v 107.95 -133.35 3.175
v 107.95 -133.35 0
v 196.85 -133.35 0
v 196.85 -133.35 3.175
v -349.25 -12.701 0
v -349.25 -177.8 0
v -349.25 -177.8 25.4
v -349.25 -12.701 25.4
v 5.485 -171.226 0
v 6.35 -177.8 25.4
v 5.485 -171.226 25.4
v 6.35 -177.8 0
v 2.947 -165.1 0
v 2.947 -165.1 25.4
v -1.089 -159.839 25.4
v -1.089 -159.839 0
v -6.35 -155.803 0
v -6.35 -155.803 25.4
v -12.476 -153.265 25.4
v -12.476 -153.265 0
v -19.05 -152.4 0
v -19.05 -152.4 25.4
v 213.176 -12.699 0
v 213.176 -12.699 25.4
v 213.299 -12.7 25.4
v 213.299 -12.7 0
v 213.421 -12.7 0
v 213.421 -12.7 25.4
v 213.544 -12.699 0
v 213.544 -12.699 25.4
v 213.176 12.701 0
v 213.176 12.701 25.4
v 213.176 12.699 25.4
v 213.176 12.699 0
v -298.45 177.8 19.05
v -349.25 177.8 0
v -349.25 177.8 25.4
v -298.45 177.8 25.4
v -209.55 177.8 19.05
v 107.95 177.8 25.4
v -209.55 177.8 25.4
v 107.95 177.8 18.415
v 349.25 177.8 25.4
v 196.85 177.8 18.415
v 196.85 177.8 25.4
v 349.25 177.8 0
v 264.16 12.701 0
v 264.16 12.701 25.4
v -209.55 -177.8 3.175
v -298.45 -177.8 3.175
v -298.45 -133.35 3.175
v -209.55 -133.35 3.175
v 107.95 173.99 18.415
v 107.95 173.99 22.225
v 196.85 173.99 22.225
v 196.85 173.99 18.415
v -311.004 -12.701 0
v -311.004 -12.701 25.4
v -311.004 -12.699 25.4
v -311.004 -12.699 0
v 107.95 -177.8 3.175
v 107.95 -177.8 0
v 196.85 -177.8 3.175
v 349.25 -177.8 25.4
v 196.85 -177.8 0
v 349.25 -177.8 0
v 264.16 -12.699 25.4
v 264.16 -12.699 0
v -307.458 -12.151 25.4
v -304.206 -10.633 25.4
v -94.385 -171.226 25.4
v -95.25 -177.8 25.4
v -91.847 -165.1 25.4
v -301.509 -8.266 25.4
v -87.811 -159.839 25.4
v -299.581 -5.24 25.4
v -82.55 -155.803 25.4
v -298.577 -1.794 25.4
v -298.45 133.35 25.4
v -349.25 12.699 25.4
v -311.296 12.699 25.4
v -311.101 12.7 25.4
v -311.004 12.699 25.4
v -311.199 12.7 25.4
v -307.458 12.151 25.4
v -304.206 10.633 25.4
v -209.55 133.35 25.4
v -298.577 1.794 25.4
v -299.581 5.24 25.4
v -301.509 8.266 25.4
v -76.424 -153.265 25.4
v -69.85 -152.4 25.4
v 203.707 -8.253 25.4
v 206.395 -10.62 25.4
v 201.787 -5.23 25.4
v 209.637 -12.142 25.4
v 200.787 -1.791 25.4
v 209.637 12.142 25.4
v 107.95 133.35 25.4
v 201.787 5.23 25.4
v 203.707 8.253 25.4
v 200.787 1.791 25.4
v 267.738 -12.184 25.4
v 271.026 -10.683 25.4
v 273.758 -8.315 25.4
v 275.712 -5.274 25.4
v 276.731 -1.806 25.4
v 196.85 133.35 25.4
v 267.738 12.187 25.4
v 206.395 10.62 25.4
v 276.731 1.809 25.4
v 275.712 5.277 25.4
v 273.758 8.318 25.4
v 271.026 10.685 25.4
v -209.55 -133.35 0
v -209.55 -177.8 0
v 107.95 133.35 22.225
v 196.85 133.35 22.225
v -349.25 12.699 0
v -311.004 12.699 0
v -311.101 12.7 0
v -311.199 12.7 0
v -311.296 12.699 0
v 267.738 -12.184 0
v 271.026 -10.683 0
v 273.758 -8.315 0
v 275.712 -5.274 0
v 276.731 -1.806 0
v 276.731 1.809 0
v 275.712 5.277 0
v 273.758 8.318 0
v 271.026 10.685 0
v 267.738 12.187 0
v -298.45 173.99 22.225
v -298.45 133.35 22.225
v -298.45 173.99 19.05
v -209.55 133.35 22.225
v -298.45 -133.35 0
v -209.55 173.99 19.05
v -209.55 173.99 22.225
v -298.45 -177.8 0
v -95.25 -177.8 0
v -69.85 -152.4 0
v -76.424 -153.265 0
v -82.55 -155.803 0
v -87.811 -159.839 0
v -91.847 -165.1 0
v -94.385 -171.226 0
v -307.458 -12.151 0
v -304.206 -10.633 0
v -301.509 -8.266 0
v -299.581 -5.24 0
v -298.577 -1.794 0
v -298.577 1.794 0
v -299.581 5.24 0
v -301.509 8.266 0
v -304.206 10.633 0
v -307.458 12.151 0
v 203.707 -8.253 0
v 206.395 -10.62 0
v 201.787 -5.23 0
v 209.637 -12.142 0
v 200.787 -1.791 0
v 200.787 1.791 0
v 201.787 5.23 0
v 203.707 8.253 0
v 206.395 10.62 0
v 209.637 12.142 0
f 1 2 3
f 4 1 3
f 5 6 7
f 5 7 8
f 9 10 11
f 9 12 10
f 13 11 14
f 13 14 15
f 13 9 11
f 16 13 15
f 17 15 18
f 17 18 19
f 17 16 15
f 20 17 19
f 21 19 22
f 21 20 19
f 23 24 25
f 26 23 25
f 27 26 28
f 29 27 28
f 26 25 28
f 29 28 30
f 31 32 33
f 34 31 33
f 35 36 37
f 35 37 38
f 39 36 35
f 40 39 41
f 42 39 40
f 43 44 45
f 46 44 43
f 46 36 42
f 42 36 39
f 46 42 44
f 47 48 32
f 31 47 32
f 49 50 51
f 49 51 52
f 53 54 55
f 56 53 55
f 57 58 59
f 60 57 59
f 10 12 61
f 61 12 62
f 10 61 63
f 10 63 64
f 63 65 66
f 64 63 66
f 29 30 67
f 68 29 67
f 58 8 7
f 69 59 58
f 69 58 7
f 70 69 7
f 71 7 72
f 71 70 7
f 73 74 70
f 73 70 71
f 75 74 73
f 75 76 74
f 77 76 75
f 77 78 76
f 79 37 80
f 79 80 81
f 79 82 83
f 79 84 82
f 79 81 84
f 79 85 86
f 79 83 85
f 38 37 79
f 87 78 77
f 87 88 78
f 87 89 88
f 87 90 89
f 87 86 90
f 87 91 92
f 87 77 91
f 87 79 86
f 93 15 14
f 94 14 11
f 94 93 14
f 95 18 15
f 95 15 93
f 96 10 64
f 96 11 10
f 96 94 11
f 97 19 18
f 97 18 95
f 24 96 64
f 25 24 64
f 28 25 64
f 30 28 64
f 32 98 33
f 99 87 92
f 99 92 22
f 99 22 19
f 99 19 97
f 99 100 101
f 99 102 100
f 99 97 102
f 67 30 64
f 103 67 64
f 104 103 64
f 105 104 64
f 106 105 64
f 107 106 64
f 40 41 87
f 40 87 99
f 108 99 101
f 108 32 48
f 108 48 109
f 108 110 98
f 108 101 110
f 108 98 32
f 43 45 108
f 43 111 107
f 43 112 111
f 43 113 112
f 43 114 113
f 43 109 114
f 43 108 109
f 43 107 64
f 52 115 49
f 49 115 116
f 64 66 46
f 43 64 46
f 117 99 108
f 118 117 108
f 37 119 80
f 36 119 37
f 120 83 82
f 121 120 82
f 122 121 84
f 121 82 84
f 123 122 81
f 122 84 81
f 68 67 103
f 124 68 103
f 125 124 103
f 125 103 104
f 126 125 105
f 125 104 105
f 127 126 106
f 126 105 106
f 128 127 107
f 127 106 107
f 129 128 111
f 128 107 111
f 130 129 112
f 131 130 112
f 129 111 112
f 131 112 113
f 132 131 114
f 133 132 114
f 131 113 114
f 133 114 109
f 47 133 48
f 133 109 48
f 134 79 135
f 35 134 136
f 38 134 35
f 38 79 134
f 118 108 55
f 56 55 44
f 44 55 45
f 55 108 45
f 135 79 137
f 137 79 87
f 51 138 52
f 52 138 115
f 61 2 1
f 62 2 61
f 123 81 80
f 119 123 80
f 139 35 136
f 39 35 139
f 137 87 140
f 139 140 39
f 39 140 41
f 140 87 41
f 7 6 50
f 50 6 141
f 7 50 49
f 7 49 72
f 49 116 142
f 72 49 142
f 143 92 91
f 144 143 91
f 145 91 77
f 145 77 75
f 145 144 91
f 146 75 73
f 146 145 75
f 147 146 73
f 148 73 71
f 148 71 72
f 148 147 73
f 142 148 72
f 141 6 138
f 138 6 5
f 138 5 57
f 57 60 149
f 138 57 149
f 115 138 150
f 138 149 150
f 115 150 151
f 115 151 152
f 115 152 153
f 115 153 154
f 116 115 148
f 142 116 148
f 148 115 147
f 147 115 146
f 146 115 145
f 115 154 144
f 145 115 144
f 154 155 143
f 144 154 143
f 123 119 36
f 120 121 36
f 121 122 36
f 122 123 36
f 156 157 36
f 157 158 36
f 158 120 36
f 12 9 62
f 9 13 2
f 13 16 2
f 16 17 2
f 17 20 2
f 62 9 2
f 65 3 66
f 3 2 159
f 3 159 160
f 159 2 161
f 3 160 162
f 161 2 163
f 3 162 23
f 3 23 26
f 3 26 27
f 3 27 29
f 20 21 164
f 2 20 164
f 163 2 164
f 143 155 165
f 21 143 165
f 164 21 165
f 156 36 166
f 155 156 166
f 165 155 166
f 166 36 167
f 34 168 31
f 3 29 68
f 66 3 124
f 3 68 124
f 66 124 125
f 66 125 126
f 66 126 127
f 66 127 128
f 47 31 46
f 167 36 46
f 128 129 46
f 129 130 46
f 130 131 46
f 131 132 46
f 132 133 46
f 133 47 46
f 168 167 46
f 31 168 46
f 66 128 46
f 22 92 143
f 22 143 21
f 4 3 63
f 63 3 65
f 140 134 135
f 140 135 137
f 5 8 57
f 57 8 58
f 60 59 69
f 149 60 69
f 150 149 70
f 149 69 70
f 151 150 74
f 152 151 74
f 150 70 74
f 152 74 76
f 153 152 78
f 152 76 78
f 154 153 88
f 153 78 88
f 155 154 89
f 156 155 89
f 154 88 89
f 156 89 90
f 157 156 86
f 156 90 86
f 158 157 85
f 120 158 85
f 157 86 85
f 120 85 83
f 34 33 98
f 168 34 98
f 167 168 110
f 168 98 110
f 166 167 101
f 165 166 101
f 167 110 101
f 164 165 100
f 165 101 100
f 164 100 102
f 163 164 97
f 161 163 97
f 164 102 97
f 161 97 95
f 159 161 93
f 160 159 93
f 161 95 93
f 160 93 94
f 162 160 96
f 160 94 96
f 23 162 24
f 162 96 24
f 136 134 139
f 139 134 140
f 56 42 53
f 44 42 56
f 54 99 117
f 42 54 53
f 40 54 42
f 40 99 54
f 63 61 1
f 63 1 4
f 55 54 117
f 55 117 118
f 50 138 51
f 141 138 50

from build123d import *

# Parameters (mm, degrees)
F0_W      = 698.5
F0_H      = 355.6
F1_DEPTH  = 25.4
F2_W      = 88.9
F2_H      = 44.45
F3_DEPTH  = 3.175
F4_W      = 88.9
F4_H      = 44.45
F5_DEPTH  = 3.175
F6_W      = 88.9
F6_H      = 3.81
F7_DEPTH  = 3.175
F8_W      = 88.9
F8_H      = 3.81
F9_DEPTH  = 3.81
F11_DEPTH = 25.4
F12_W     = 101.6
F12_H     = 25.4
F13_DEPTH = 25.4
F14_R     = 25.39999


# Not quite as in the source:
# - a fillet or chamfer is up to 0.001 mm smaller than in the source, because OpenCascade refuses the exact size


with BuildPart() as f1:
    # F0 (on Top) → F1 (new body)
    with BuildSketch(Plane.XY):
        Rectangle(F0_W, F0_H)
    extrude(amount=F1_DEPTH)

    # F2 (on face) → F3 (cut)
    with BuildSketch(Plane.XY.offset(25.4)):
        with Locations((-254, 155.575)):
            Rectangle(F2_W, F2_H)
        with Locations((152.4, 155.575)):
            Rectangle(F2_W, F2_H)
    extrude(amount=-F3_DEPTH, mode=Mode.SUBTRACT)

    # F4 (on face) → F5 (cut)
    with BuildSketch(Plane(origin=(0, 0, 0), x_dir=(1, 0, 0), z_dir=(0, 0, -1))):
        with Locations((-254, 155.575)):
            Rectangle(F4_W, F4_H)
        with Locations((152.4, 155.575)):
            Rectangle(F4_W, F4_H)
    extrude(amount=-F5_DEPTH, mode=Mode.SUBTRACT)

    # F6 (on face) → F7 (cut)
    with BuildSketch(Plane.XY.offset(22.225)):
        with Locations((-254, 175.895)):
            Rectangle(F6_W, F6_H)
    extrude(amount=-F7_DEPTH, mode=Mode.SUBTRACT)

    # F8 (on face) → F9 (cut)
    with BuildSketch(Plane.XY.offset(22.225)):
        with Locations((152.4, 175.895)):
            Rectangle(F8_W, F8_H)
    extrude(amount=-F9_DEPTH, mode=Mode.SUBTRACT)

    # F10 (on face) → F11 (cut)
    with BuildSketch(Plane.XY.offset(25.4)):
        with BuildLine():
            Line((-311.0040204385, -12.7008390054), (-311.0040204385, -12.6991609946))
            ThreePointArc((-311.0040204385, -12.6991609946), (-298.45, 0), (-311.0040204385, 12.6991609946))
            Line((-311.0040204385, 12.6991609946), (-311.2959795615, 12.6991609946))
            Line((-311.2959795615, 12.6991609946), (-354.8822260717, 12.6991609946))
            Line((-354.8822260717, 12.6991609946), (-354.8822260717, -12.7008390054))
            Line((-354.8822260717, -12.7008390054), (-311.0040204385, -12.7008390054))
        make_face()
        with BuildLine():
            Line((-311.2959795615, 12.6991609946), (-311.0040204385, 12.6991609946))
            ThreePointArc((-311.0040204385, 12.6991609946), (-311.15, 12.7), (-311.2959795615, 12.6991609946))
        make_face()
        with BuildLine():
            Line((213.1756003467, 12.7013387805), (213.1756003467, 12.6986612195))
            ThreePointArc((213.1756003467, 12.6986612195), (200.66, 0), (213.1756003467, -12.6986612195))
            Line((213.1756003467, -12.6986612195), (213.5443996533, -12.6986612195))
            Line((213.5443996533, -12.6986612195), (264.16, -12.6986612195))
            ThreePointArc((264.16, -12.6986612195), (276.86, 0.0013387805), (264.16, 12.7013387805))
            Line((264.16, 12.7013387805), (213.1756003467, 12.7013387805))
        make_face()
        with BuildLine():
            Line((213.5443996533, -12.6986612195), (213.1756003467, -12.6986612195))
            ThreePointArc((213.1756003467, -12.6986612195), (213.36, -12.7), (213.5443996533, -12.6986612195))
        make_face()
    extrude(amount=-F11_DEPTH, mode=Mode.SUBTRACT)

    # F12 (on face) → F13 (cut)
    with BuildSketch(Plane.XY.offset(25.4)):
        with Locations((-44.45, -165.1)):
            Rectangle(F12_W, F12_H)
    extrude(amount=-F13_DEPTH, mode=Mode.SUBTRACT)

    # F14 (radius 25.4 in the source; OpenCascade refuses exactly that, so slightly less here)
    f14_edges = [f1.edges().sort_by_distance(p)[0] for p in [
        (-95.25, -152.4, 12.7),
        (6.35, -152.4, 12.7),
    ]]
    fillet(f14_edges, radius=F14_R)


solid = f1.part
